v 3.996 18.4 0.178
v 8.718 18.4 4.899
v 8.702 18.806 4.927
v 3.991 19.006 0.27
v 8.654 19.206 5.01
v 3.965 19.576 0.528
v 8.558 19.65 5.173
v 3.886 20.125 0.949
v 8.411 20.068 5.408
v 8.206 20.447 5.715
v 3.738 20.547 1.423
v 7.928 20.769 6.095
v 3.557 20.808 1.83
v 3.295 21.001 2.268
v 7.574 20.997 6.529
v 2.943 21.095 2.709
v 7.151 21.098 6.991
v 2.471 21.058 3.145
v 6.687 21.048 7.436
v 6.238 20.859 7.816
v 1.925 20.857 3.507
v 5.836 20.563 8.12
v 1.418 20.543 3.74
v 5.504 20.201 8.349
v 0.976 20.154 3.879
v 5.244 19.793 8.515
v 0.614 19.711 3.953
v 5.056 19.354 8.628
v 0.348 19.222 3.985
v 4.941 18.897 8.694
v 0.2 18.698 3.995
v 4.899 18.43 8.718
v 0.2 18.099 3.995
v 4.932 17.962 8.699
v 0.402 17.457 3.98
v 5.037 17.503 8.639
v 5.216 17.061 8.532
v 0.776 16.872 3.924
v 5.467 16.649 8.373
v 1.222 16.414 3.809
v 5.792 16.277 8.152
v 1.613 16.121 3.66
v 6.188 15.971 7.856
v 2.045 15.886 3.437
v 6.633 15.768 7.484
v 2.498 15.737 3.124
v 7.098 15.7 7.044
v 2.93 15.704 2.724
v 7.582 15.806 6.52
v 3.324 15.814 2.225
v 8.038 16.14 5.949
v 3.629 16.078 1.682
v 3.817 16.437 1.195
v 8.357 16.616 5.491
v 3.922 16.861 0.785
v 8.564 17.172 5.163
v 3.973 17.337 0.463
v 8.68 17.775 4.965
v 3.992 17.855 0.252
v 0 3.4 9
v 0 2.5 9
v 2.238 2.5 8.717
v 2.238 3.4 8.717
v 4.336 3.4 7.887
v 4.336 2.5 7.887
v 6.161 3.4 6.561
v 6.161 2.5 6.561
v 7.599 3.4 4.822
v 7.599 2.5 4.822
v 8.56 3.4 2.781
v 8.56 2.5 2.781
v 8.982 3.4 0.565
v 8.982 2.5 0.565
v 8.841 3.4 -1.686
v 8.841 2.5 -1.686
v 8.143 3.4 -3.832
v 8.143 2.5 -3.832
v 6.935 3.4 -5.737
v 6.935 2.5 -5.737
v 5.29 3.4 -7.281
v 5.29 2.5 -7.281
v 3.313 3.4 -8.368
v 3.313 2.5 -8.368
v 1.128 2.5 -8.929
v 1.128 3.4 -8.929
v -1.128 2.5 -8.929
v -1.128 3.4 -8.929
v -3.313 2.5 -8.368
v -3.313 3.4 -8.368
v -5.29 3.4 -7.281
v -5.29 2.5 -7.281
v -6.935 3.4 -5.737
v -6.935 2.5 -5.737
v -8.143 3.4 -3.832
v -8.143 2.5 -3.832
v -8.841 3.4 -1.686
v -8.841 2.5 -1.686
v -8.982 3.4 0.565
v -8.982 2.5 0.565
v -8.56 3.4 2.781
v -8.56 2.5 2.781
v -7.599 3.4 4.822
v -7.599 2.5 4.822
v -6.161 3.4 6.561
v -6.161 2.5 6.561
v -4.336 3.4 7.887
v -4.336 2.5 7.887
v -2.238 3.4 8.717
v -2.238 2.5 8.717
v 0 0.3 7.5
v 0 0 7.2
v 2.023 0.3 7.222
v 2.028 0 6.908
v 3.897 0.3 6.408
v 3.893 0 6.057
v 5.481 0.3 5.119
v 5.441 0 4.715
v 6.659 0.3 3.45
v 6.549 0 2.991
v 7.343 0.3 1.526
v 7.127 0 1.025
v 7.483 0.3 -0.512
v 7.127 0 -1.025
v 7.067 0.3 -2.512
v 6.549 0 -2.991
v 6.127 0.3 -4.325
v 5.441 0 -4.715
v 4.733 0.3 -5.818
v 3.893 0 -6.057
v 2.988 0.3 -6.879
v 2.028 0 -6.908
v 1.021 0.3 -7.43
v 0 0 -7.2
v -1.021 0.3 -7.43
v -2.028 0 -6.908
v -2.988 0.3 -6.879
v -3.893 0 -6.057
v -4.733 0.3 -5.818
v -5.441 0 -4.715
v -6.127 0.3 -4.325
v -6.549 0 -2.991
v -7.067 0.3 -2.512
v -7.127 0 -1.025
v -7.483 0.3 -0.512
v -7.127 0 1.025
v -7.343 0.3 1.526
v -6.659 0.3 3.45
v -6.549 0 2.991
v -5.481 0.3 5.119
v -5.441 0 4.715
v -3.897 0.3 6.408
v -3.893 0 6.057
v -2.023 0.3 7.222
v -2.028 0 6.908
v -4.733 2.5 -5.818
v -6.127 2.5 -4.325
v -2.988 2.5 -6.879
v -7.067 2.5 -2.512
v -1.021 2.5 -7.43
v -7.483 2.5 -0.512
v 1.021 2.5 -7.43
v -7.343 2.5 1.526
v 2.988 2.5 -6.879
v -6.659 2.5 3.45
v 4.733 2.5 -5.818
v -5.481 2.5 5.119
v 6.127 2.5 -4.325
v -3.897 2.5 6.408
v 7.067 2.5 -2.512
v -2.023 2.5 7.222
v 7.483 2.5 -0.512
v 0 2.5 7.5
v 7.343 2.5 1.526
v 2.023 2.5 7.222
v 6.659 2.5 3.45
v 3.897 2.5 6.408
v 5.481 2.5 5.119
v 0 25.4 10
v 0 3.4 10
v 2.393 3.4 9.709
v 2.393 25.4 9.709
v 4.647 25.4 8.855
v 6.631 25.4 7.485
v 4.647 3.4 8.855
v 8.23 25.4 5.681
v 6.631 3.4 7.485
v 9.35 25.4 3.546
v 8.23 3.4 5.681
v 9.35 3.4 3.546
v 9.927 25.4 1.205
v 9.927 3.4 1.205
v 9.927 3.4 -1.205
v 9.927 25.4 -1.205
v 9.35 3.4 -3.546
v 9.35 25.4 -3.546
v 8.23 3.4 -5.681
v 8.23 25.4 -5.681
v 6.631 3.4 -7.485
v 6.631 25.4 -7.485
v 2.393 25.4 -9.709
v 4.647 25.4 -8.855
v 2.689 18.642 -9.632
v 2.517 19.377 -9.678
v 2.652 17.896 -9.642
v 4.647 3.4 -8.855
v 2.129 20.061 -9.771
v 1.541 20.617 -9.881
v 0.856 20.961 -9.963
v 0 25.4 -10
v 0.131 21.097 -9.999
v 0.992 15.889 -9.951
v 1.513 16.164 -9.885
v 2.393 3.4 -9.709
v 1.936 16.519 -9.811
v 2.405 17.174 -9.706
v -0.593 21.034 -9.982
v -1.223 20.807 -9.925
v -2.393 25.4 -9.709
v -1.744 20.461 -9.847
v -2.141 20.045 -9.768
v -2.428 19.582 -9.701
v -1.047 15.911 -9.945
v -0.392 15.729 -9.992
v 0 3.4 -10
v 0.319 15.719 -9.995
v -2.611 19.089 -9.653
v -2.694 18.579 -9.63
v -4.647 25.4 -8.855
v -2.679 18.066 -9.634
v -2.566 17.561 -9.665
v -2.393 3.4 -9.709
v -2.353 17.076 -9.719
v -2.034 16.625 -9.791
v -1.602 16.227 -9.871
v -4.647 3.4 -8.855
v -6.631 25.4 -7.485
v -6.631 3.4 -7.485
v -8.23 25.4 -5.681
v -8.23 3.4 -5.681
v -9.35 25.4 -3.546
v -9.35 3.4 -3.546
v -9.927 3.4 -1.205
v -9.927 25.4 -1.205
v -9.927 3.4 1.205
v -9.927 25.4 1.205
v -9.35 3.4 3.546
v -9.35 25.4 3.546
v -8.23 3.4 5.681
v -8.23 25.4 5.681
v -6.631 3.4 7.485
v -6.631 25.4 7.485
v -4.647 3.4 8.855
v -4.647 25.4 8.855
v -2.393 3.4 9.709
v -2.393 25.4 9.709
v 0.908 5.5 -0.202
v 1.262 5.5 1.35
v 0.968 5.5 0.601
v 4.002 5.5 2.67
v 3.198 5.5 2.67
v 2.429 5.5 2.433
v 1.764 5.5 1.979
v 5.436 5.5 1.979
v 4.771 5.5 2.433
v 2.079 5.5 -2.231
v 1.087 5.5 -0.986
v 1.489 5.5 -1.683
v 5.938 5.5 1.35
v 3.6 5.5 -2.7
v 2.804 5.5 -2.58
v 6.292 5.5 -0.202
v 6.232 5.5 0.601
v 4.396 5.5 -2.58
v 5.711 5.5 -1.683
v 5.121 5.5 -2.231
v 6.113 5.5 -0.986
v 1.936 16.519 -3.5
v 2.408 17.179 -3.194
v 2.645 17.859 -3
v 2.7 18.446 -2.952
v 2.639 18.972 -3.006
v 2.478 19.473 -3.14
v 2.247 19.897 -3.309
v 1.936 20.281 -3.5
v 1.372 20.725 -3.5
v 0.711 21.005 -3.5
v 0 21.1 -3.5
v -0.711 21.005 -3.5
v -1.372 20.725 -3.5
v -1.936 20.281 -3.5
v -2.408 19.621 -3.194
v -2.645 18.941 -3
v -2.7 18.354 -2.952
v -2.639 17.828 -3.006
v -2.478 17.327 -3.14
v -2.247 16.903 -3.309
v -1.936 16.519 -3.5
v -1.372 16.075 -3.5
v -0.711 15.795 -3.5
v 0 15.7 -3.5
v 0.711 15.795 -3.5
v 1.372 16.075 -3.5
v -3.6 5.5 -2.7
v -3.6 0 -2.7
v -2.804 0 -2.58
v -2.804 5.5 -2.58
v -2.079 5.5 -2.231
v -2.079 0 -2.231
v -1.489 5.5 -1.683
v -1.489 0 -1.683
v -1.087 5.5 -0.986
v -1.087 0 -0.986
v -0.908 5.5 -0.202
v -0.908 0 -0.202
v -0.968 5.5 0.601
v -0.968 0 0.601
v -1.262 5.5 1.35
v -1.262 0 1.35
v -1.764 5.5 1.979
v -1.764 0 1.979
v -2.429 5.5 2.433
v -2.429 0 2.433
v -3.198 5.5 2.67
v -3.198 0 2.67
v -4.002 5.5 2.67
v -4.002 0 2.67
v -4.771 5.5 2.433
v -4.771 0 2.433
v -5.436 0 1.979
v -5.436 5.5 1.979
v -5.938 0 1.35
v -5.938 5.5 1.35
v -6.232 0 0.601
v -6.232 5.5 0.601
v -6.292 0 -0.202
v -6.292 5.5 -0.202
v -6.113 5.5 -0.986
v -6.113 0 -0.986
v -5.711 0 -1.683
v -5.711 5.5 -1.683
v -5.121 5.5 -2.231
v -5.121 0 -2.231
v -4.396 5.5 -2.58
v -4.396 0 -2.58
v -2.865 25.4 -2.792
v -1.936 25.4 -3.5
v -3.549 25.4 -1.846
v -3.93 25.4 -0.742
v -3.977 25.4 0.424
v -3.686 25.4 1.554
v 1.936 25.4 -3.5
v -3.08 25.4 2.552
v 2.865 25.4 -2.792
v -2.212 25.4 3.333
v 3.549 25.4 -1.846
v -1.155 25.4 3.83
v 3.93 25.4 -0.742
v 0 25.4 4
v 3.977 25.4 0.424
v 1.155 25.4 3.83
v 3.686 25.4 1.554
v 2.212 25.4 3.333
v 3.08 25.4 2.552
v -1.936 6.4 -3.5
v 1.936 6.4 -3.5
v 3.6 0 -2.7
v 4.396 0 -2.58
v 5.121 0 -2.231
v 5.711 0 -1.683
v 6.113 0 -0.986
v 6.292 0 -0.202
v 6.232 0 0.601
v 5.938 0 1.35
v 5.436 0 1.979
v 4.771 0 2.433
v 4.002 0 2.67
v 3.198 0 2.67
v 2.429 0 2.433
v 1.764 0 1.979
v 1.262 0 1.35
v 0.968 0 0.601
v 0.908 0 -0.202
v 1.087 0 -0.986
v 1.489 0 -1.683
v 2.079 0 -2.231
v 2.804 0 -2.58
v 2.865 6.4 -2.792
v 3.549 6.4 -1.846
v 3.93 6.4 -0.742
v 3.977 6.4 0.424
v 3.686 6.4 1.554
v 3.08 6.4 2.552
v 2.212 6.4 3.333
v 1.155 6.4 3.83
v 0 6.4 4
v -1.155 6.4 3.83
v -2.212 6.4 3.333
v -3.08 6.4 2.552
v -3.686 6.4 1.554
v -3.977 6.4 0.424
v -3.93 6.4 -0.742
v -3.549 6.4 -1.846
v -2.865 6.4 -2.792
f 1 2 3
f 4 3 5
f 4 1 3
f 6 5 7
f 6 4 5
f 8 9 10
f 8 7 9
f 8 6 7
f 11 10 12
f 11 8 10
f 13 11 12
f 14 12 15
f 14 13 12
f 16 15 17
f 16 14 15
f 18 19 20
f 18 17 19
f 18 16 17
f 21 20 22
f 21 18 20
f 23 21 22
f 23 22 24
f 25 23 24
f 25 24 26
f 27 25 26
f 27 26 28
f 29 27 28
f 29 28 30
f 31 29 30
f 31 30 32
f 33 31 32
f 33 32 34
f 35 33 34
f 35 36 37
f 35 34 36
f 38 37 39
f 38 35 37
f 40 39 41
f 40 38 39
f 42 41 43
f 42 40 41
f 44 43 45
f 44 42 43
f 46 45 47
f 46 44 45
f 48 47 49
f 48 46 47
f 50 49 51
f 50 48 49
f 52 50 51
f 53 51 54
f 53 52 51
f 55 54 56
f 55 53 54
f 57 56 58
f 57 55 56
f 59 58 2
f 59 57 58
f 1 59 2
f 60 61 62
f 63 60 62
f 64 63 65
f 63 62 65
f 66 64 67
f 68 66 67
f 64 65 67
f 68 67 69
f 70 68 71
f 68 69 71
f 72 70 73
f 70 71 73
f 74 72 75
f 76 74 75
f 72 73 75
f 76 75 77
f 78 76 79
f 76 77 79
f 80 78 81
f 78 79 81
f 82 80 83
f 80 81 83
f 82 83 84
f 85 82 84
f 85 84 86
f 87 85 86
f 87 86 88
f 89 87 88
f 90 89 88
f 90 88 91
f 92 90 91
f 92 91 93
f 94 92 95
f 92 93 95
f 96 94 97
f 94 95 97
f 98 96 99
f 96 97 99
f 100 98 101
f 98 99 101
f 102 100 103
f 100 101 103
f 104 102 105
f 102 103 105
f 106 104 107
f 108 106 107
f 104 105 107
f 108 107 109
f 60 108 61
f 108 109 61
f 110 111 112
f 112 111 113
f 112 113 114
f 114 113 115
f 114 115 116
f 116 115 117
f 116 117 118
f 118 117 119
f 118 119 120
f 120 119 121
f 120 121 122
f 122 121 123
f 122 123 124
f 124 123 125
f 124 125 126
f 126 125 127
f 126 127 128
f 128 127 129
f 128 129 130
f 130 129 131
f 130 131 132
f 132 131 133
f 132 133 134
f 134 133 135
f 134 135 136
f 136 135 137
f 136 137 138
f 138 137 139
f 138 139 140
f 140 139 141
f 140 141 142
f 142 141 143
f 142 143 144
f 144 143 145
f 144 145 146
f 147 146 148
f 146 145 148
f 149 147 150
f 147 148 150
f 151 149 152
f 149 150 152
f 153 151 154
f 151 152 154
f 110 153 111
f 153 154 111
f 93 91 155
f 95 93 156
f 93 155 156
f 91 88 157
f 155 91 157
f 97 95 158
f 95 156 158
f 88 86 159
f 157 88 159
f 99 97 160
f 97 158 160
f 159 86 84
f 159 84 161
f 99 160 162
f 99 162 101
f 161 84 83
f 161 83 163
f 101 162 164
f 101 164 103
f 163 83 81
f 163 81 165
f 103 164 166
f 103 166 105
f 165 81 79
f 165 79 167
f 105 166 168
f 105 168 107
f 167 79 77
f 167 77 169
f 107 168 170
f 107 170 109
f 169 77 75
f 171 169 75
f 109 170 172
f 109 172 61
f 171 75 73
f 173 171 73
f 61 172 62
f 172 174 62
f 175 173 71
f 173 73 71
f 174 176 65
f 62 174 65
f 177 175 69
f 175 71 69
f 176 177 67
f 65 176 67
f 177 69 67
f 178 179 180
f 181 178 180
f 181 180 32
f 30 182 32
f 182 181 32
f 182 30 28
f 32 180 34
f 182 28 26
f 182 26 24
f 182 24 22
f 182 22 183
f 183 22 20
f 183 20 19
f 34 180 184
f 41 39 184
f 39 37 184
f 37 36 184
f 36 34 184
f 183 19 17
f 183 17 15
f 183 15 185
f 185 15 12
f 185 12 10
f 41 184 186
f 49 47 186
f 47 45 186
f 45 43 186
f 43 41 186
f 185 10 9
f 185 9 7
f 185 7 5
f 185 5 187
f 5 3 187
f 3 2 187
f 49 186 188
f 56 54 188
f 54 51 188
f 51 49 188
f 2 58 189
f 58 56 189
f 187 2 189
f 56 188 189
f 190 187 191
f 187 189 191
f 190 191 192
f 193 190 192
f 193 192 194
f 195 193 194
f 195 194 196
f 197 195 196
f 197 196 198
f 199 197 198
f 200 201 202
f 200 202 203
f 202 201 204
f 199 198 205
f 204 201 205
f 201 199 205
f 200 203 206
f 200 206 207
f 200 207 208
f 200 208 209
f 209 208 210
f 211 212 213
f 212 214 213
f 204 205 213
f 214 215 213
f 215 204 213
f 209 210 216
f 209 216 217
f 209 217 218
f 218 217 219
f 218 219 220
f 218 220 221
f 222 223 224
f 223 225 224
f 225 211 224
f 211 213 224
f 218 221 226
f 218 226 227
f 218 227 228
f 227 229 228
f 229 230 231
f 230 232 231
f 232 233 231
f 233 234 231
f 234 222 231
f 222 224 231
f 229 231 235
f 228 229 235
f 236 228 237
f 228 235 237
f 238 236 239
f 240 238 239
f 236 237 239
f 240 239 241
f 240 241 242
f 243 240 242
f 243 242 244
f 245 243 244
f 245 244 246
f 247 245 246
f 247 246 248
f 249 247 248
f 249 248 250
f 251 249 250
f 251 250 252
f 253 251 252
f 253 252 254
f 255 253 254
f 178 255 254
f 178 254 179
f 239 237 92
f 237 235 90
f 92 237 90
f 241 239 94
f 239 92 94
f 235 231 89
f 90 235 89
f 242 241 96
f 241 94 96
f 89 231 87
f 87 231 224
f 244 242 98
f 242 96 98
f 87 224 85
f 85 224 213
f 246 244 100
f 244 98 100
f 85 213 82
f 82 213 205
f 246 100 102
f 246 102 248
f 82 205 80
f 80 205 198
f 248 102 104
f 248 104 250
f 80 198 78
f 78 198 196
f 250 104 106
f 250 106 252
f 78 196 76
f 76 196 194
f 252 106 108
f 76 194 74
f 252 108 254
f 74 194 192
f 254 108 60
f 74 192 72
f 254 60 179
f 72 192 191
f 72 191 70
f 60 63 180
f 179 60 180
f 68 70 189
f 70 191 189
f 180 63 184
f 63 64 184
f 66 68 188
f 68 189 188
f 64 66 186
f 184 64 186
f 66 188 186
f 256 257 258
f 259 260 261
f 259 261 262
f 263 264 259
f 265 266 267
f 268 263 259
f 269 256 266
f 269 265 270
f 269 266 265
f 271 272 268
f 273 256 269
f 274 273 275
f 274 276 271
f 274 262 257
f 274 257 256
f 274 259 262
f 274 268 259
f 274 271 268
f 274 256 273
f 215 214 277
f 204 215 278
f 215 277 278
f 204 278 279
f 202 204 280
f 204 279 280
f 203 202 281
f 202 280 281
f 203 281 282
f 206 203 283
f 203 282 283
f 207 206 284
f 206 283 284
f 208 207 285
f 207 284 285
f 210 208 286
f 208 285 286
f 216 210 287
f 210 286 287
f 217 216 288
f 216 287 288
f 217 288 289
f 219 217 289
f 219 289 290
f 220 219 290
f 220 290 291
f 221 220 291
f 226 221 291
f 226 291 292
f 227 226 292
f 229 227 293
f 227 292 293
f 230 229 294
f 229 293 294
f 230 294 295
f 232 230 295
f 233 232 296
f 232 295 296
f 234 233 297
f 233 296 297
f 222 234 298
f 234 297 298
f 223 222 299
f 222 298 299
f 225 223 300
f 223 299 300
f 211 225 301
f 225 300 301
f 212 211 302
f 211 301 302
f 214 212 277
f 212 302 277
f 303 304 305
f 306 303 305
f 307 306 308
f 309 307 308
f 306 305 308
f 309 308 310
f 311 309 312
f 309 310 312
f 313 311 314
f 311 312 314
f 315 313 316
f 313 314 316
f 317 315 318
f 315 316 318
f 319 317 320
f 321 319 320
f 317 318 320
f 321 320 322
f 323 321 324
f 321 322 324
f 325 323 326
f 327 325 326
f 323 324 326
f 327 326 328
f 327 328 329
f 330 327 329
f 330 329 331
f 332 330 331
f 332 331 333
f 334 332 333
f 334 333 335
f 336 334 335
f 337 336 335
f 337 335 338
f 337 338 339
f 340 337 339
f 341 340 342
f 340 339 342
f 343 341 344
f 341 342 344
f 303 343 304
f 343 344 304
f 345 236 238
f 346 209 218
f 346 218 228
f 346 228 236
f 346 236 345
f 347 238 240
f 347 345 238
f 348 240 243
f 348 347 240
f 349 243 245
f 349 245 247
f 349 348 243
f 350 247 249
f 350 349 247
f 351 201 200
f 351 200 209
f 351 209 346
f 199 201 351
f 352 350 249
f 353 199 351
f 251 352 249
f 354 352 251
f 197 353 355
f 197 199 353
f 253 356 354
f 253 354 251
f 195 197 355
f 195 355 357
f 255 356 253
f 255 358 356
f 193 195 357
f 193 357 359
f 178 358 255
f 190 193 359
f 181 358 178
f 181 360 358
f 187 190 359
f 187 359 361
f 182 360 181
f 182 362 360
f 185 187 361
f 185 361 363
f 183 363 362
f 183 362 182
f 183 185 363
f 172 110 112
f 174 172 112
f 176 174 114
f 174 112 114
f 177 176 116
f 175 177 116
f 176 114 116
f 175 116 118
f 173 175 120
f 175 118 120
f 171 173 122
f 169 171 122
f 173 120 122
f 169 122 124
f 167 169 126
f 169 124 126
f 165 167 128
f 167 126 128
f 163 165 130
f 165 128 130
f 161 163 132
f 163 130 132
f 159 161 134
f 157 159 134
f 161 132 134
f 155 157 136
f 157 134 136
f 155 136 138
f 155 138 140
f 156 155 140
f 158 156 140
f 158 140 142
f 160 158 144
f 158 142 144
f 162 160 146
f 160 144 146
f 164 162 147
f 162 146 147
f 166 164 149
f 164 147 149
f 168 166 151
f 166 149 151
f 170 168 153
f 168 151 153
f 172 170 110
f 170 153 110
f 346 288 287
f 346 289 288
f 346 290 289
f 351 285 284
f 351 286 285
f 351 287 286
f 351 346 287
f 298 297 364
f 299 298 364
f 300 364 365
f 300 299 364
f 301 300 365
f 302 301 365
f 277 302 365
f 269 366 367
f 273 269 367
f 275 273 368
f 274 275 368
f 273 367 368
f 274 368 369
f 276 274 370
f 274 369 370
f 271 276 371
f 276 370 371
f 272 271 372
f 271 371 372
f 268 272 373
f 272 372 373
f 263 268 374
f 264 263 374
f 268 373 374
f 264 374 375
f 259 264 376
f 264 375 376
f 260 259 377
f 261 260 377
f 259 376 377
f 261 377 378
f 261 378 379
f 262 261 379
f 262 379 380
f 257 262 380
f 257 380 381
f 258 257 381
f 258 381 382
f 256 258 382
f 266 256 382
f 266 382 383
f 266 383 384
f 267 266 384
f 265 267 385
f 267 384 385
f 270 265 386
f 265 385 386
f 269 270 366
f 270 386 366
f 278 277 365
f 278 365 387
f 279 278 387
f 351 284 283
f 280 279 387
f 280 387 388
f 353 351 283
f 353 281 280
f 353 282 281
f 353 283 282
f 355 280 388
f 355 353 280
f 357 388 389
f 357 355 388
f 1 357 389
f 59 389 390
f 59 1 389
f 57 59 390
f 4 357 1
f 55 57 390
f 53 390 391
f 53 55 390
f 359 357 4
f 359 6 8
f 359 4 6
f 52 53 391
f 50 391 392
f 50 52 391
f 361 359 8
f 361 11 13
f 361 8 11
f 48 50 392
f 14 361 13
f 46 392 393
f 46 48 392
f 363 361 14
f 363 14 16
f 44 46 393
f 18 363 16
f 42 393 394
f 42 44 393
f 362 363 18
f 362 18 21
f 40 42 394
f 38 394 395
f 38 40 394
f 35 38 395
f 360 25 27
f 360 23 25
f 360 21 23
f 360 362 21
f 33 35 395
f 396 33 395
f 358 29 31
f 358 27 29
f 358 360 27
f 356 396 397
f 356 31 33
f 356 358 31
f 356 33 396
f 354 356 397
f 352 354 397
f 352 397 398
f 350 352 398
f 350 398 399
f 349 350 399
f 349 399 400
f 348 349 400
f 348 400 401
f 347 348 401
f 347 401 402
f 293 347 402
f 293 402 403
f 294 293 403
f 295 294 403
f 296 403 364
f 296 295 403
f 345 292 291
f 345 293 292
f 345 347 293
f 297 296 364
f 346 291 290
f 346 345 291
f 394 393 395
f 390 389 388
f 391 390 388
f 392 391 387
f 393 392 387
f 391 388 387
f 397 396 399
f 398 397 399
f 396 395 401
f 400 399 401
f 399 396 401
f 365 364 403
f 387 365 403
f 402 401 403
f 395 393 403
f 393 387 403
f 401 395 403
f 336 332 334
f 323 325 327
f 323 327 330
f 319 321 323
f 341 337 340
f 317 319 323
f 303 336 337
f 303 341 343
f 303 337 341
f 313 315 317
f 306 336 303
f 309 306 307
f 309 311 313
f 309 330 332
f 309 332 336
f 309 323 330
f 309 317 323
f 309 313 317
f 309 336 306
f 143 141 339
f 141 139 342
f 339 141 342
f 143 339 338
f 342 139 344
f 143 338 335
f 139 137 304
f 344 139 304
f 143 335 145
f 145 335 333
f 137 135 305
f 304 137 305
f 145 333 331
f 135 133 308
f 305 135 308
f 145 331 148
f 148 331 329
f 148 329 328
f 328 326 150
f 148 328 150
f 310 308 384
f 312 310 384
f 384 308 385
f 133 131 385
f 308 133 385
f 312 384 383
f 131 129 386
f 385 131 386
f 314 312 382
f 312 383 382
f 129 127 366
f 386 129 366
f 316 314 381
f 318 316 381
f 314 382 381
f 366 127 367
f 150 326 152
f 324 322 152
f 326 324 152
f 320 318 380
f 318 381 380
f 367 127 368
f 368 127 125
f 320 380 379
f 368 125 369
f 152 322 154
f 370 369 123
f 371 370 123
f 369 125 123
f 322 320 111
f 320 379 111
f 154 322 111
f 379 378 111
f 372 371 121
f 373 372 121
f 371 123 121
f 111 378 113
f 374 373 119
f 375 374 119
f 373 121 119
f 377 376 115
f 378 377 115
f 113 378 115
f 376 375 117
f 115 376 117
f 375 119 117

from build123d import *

# Parameters (mm, degrees)
SKETCH1_R             = 7.5
BOSS_EXTRUDE1_DEPTH   = 2.5
SKETCH2_R             = 9
BOSS_EXTRUDE2_DEPTH   = 0.9
SKETCH3_R             = 10
BOSS_EXTRUDE3_DEPTH   = 22
SKETCH5_R             = 2.7
CUT_EXTRUDE1_DEPTH    = 5.5
CUT_EXTRUDE2_DEPTH    = 19
SKETCH7_R             = 2.7
CUT_EXTRUDE3_DEPTH    = 30.071635661
CIRPATTERN1_START     = 2.951270805
CIRPATTERN1_OUTLINE_R = 2.7
CIRPATTERN1_DEPTH     = 7.048729295
CHAMFER1_SIZE         = 0.3


# Read off the part's stored shape, not the designer's step: CirPattern1
with BuildPart() as part:
    # Sketch1 → Boss-Extrude1 (new body)
    with BuildSketch(Plane(origin=(0, 0, 0), x_dir=(1, 0, 0), z_dir=(0, 1, 0))):
        with Locations(Location((0, 0, 0), (0, 0, 270))):
            Circle(SKETCH1_R)
    extrude(amount=BOSS_EXTRUDE1_DEPTH)

    # Sketch2 → Boss-Extrude2 (add)
    with BuildSketch(Plane(origin=(0, 2.5, 0), x_dir=(1, 0, 0), z_dir=(0, 1, 0))):
        with Locations(Location((0, 0, 0), (0, 0, 270))):
            Circle(SKETCH2_R)
    extrude(amount=BOSS_EXTRUDE2_DEPTH)

    # Sketch3 → Boss-Extrude3 (add)
    with BuildSketch(Plane(origin=(0, 3.4, 0), x_dir=(1, 0, 0), z_dir=(0, 1, 0))):
        with Locations(Location((0, 0, 0), (0, 0, 270))):
            Circle(SKETCH3_R)
    extrude(amount=BOSS_EXTRUDE3_DEPTH)

    # Sketch5 → Cut-Extrude1 (cut)
    with BuildSketch(Plane.XZ):
        with Locations(Location((3.6, 0, 0), (0, 0, 270))):
            Circle(SKETCH5_R)
        with Locations(Location((-3.6, 0, 0), (0, 0, 270))):
            Circle(SKETCH5_R)
    extrude(amount=-CUT_EXTRUDE1_DEPTH, mode=Mode.SUBTRACT)

    # Sketch6 → Cut-Extrude2 (cut)
    with BuildSketch(Plane(origin=(0, 25.4, 0), x_dir=(1, 0, 0), z_dir=(0, 1, 0))):
        with BuildLine():
            Line((-1.936491673, 3.5), (1.936491673, 3.5))
            ThreePointArc((1.936491673, 3.5), (0, -4), (-1.936491673, 3.5))
        make_face()
    extrude(amount=-CUT_EXTRUDE2_DEPTH, mode=Mode.SUBTRACT)

    # Sketch7 → Cut-Extrude3 (cut, through all)
    with BuildSketch(Plane.XY):
        with Locations(Location((0, 18.4, 0), (0, 0, 315.82536203))):
            Circle(SKETCH7_R)
    extrude(amount=-CUT_EXTRUDE3_DEPTH, mode=Mode.SUBTRACT)

    # CirPattern1 outline → CirPattern1 (cut)
    with BuildSketch(Plane(origin=(0, 0, 0), x_dir=(0.7071067811865509, 0, -0.707106781186544), z_dir=(0.707106781186544, 0, 0.707106781186551)).offset(CIRPATTERN1_START)):
        with Locations((0, 18.4)):
            Circle(CIRPATTERN1_OUTLINE_R)
    extrude(amount=CIRPATTERN1_DEPTH, mode=Mode.SUBTRACT)

    # Chamfer1
    chamfer1_edges = [part.edges().sort_by_distance(p)[0] for p in [
        (0, 0, -7.5),
    ]]
    chamfer(chamfer1_edges, length=CHAMFER1_SIZE)


solid = part.part
